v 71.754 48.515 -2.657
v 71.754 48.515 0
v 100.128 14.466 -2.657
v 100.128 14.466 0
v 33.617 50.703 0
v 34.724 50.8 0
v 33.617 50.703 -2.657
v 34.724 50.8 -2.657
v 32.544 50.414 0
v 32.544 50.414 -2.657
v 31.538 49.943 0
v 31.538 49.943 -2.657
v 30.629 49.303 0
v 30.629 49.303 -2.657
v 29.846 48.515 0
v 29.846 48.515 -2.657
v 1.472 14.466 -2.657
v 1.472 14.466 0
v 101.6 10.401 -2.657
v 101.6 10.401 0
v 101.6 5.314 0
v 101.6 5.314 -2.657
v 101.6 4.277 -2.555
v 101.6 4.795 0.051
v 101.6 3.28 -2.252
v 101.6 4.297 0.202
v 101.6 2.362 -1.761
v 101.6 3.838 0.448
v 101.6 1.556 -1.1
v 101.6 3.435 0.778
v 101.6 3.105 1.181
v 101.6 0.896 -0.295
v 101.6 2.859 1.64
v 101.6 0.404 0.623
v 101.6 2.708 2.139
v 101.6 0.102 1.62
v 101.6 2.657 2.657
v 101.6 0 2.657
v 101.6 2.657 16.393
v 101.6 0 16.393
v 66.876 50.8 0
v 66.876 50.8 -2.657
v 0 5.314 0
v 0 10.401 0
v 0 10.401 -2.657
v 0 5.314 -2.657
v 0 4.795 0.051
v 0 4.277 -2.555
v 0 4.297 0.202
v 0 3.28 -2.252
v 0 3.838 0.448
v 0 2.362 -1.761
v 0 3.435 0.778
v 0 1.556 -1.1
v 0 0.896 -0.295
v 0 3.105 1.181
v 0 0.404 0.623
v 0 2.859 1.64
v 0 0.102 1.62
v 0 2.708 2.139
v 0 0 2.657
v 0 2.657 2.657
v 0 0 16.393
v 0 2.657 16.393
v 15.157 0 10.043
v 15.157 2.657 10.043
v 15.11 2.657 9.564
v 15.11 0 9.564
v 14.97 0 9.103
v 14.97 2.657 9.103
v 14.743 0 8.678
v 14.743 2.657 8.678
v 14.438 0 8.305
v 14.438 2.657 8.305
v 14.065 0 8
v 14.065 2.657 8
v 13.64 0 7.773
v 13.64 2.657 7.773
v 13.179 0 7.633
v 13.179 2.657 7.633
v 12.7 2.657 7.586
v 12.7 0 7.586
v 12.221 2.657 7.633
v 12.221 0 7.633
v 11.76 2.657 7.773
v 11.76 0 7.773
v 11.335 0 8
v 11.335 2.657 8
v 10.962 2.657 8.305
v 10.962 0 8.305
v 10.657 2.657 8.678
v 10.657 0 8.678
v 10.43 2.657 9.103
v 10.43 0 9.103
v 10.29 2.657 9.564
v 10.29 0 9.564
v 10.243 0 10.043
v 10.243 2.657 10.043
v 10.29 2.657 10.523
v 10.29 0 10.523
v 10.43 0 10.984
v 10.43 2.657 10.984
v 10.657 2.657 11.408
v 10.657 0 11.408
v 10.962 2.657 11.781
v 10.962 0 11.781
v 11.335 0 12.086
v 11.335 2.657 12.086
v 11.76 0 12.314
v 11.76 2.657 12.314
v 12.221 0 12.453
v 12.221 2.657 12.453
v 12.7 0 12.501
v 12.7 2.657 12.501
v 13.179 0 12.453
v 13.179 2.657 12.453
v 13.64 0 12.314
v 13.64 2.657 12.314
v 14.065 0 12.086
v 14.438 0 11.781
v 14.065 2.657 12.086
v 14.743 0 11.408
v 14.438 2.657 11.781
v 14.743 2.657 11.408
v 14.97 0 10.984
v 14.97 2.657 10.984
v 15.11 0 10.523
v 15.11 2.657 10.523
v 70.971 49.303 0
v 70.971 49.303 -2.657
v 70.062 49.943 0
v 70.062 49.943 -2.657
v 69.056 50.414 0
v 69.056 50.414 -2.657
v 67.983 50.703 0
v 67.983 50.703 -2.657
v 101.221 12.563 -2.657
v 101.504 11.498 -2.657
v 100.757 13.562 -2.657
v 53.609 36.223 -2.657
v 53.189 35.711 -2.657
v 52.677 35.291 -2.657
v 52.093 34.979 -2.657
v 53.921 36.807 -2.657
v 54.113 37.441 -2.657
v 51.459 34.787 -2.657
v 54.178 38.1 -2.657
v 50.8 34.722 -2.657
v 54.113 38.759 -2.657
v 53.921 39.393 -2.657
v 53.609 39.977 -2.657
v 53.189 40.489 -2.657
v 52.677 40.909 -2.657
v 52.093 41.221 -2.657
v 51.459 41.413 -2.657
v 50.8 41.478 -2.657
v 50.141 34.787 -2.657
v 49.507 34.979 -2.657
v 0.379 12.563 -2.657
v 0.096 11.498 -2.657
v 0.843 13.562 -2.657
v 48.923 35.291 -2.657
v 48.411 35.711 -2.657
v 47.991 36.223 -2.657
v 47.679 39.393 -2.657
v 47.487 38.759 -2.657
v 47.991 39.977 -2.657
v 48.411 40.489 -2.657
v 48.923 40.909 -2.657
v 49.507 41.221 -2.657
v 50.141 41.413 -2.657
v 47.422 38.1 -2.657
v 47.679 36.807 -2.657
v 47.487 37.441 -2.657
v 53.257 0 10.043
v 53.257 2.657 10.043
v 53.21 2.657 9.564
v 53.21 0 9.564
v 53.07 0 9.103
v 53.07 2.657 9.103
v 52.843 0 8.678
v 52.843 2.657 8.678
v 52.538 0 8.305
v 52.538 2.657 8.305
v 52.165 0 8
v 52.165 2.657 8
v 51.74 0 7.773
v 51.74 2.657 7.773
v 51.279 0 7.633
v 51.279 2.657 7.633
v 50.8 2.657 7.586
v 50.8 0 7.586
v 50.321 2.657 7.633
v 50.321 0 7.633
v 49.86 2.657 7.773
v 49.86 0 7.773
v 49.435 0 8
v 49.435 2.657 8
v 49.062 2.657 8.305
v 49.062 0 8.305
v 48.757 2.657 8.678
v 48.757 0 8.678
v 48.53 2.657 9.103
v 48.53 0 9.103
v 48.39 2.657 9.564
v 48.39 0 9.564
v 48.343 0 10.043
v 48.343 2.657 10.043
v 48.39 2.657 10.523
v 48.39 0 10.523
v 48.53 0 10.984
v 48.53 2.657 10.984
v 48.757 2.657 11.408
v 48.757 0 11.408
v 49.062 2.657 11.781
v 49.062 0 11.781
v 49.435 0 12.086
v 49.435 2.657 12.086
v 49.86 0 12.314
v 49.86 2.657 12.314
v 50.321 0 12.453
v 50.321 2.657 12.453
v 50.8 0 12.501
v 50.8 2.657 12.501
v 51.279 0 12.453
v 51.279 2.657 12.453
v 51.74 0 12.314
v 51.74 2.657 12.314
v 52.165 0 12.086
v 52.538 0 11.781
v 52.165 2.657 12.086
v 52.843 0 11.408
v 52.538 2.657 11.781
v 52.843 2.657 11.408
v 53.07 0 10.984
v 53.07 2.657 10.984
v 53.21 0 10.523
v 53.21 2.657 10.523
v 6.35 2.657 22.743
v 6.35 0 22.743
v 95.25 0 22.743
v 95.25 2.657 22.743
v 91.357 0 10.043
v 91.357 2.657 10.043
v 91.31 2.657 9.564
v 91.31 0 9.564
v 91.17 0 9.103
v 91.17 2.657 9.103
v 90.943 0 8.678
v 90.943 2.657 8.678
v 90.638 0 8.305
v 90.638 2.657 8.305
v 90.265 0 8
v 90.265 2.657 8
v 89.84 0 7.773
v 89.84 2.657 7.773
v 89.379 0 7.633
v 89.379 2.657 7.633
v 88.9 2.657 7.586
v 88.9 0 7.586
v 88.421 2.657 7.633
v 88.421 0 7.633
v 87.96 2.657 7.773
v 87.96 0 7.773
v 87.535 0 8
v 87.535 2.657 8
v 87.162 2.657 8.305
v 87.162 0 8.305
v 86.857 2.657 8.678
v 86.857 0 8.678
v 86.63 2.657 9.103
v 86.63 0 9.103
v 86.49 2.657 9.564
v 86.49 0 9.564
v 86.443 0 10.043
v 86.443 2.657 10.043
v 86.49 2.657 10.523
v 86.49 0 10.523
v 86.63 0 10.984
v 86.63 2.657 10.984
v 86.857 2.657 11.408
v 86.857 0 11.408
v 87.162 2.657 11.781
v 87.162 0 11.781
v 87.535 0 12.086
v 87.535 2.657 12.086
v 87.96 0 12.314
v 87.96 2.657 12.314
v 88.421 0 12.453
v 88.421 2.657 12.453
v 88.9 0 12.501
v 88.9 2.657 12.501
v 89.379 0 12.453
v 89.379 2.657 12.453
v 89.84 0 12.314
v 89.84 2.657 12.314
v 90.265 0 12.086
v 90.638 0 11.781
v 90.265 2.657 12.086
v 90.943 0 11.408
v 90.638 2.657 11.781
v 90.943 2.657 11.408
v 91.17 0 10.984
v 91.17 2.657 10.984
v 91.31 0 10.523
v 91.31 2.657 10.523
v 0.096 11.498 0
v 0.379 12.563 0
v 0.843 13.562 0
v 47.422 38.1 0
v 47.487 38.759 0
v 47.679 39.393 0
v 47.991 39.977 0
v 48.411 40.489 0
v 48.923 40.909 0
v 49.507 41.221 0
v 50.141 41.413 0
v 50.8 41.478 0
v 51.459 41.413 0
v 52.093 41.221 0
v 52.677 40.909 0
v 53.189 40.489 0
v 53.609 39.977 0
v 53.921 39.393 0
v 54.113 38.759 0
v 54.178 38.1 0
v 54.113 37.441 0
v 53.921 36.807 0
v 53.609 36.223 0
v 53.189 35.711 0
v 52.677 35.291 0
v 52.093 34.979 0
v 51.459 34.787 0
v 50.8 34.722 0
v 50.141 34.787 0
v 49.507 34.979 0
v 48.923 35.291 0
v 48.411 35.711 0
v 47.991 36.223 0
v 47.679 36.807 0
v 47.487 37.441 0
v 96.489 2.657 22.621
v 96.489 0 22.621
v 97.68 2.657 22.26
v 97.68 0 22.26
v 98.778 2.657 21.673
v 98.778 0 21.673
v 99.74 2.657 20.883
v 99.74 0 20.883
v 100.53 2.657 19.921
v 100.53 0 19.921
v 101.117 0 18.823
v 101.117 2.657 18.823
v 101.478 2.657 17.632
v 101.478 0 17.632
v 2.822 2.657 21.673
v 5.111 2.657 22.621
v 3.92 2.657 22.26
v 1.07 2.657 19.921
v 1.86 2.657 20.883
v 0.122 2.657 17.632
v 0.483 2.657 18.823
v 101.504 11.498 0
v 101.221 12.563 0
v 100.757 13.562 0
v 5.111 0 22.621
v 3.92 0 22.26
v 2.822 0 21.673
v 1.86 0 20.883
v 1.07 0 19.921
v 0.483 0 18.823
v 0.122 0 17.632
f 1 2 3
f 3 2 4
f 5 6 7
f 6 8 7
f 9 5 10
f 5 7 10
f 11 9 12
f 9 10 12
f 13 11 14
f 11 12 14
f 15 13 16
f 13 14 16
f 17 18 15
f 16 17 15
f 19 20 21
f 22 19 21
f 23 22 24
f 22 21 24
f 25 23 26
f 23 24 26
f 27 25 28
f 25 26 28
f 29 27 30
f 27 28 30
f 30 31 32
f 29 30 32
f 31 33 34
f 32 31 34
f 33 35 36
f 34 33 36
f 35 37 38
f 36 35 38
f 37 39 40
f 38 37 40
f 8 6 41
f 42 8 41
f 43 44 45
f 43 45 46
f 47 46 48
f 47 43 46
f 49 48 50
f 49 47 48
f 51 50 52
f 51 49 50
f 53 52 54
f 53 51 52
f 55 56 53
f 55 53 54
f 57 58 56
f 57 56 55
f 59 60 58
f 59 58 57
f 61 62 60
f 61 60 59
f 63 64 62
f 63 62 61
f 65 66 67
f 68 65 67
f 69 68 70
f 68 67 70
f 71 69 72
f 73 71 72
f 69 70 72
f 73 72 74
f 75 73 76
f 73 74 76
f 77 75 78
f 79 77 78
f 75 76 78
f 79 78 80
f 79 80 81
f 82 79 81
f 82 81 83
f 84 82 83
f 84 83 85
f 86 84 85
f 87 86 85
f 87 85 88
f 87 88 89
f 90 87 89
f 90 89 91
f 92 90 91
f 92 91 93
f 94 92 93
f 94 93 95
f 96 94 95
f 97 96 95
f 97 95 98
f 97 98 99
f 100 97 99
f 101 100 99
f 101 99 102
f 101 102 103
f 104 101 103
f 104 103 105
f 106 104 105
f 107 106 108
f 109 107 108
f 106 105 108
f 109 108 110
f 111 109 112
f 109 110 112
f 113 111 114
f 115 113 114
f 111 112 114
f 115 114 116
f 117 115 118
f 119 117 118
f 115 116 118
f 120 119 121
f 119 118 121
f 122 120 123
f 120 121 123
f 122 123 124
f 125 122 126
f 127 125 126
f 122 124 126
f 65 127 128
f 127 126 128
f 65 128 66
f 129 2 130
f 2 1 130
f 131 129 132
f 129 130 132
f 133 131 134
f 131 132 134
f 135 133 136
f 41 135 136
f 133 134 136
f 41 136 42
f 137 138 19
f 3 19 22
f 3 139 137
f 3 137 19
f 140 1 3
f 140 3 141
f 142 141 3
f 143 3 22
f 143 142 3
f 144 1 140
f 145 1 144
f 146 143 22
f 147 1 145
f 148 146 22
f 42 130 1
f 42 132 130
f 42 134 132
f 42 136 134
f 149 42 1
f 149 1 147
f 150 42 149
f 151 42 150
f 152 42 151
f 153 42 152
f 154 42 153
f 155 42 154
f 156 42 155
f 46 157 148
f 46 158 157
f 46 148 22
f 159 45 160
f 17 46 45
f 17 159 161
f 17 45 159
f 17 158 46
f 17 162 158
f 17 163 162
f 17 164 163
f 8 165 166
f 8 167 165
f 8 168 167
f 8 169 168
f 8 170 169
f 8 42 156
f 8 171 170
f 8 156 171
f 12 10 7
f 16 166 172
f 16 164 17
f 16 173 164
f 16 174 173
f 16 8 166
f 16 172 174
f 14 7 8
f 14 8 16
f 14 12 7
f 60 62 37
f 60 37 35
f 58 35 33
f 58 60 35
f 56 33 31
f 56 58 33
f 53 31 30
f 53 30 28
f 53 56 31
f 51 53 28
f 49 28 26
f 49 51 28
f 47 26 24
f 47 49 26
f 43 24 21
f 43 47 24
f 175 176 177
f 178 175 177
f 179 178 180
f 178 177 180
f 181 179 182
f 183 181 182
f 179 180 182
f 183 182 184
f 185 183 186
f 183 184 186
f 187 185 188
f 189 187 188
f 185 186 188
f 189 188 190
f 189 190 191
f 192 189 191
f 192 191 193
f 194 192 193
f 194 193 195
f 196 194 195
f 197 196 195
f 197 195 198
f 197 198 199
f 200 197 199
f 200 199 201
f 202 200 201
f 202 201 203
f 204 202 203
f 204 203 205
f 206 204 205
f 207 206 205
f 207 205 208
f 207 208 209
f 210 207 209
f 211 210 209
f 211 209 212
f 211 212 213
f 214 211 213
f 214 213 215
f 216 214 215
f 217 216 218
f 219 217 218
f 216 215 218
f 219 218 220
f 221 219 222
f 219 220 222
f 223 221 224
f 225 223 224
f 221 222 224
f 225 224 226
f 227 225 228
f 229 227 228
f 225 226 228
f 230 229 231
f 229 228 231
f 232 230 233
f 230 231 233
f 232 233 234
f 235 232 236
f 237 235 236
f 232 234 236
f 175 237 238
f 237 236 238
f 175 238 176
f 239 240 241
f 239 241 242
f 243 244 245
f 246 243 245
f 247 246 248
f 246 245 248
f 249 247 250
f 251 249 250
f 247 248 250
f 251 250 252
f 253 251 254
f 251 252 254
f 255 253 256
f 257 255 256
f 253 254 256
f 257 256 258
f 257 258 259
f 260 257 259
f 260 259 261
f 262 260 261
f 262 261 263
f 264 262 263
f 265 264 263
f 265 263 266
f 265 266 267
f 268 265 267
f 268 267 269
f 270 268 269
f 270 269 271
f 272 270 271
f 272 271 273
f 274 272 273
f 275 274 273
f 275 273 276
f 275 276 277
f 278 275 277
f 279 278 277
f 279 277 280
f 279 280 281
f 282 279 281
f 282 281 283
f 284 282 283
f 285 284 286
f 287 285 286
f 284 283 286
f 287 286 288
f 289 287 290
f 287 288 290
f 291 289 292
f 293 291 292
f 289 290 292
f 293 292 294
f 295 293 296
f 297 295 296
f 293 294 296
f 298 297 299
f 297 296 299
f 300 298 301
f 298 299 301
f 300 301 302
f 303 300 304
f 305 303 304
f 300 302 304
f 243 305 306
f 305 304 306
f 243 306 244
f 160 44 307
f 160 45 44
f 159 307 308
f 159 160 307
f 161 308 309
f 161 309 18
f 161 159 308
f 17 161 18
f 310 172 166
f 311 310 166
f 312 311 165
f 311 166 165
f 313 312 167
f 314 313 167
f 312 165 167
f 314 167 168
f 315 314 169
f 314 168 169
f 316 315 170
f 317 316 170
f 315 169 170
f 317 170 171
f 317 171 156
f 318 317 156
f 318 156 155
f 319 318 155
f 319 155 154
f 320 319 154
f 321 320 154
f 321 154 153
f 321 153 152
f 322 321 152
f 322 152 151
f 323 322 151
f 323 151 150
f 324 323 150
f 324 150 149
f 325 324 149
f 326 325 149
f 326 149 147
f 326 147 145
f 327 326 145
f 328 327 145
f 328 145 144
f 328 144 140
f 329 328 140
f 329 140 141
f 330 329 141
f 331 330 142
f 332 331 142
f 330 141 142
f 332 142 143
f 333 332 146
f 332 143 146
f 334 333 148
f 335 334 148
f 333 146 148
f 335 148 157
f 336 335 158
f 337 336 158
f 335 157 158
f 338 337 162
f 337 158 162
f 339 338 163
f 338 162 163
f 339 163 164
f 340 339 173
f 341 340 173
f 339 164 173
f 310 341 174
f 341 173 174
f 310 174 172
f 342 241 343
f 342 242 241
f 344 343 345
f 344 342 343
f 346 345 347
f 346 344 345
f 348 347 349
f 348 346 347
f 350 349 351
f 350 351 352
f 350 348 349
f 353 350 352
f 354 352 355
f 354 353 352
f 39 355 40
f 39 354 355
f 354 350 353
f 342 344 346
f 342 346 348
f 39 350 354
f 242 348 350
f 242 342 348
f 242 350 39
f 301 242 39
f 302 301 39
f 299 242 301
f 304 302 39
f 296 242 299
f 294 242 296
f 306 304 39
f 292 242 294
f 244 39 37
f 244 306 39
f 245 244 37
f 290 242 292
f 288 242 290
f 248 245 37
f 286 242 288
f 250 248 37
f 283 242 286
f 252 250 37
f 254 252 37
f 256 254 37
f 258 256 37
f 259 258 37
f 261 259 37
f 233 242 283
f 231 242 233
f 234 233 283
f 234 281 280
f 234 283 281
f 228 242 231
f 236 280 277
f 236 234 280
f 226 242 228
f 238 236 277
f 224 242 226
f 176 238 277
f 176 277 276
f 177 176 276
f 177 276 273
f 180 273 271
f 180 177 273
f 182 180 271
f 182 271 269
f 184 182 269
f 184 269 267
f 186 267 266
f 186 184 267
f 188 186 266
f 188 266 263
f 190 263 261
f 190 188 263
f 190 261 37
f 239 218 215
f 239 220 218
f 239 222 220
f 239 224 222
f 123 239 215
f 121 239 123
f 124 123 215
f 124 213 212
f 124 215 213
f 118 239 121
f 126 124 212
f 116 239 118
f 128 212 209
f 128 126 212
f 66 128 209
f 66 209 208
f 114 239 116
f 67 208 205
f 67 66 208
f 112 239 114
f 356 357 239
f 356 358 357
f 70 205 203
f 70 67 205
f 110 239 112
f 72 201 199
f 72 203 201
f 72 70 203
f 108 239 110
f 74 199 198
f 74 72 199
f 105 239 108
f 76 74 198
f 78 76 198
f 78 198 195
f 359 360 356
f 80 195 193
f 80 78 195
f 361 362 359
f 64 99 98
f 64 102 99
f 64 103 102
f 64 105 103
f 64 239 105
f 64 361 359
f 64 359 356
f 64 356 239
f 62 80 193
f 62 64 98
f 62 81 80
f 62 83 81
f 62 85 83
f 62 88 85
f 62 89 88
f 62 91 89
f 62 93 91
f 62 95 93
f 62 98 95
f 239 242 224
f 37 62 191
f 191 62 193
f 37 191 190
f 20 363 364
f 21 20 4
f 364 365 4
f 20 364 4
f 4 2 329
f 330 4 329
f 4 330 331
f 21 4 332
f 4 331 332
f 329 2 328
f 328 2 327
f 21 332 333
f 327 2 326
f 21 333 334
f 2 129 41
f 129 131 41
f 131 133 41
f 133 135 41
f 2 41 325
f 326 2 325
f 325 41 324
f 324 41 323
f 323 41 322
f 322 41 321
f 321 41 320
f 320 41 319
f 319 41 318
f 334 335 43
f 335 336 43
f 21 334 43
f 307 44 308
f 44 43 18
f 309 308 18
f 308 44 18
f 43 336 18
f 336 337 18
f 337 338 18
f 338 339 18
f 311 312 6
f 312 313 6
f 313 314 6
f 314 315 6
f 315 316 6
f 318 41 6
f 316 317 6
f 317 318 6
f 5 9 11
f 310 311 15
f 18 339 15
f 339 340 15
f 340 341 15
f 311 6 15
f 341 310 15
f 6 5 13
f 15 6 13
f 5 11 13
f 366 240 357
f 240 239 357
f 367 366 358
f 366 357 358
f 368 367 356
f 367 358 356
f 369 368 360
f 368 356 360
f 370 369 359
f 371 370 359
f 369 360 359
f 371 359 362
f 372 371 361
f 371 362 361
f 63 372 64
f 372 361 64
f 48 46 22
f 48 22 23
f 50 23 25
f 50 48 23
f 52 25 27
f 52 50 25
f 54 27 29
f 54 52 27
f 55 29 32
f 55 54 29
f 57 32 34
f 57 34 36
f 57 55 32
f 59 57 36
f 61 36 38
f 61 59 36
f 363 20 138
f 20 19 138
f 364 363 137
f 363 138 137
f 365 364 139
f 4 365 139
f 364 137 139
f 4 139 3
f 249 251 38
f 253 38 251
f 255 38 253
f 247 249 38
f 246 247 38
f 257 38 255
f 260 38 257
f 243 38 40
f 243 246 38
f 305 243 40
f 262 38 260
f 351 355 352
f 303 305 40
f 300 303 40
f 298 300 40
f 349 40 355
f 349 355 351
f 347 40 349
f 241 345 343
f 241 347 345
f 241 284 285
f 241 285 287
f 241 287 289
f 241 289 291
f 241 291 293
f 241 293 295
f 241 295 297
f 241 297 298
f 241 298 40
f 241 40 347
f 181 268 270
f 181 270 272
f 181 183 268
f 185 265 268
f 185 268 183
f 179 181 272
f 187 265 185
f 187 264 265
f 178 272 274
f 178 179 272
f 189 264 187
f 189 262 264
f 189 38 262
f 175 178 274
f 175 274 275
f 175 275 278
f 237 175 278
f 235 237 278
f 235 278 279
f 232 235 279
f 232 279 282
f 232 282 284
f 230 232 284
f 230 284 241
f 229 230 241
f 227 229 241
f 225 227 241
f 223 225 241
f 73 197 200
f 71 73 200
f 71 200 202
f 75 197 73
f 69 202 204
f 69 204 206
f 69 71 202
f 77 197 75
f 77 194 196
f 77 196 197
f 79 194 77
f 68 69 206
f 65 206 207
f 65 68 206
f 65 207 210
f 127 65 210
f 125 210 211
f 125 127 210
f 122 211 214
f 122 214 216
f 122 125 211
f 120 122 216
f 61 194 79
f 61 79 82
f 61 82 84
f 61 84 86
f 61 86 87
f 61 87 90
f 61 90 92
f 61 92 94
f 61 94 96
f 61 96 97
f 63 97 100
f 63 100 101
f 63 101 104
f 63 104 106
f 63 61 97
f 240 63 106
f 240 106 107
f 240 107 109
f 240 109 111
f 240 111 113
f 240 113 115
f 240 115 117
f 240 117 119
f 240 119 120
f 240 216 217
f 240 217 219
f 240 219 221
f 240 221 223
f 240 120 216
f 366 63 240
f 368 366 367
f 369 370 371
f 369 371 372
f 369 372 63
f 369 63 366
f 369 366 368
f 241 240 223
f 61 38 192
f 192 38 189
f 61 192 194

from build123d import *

# Parameters (mm, degrees)
BASE_FLANGE1_DEPTH           = 2.65684
EDGE_FLANGE1_STRIP_W         = 15.94104
EDGE_FLANGE1_STRIP_H         = 2.65684
EDGE_FLANGE1_STRIP_CUT_DEPTH = 101.6
EDGE_FLANGE1_DEPTH           = 101.6
FILLET1_R                    = 6.35
F_10_0_1935_DIAMETER_HOLE1_D = 4.9149
F_1_4_CLEARANCE_HOLE1_D      = 6.7564


# Sheet-metal steps are written as plain solids
with BuildPart() as part:
    # Sketch1 → Base-Flange1 (new body)
    with BuildSketch(Plane.XY):
        Polygon((0, 0), (0, 12.7), (31.75, 50.8), (69.85, 50.8), (101.6, 12.7), (101.6, 0), align=None)
    extrude(amount=-BASE_FLANGE1_DEPTH)

    # Edge-Flange1 strip (across the edge) → Edge-Flange1 strip cut (cut)
    with BuildSketch(Plane.YZ):
        with Locations((-2.65684, -1.32842)):
            Rectangle(EDGE_FLANGE1_STRIP_W, EDGE_FLANGE1_STRIP_H)
    extrude(amount=EDGE_FLANGE1_STRIP_CUT_DEPTH, mode=Mode.SUBTRACT)

    # Edge-Flange1 section (across the edge) → Edge-Flange1 (add)
    with BuildSketch(Plane.YZ):
        with BuildLine():
            Line((0, 2.65684), (0, 22.74316))
            Line((0, 22.74316), (2.65684, 22.74316))
            Line((2.65684, 22.74316), (2.65684, 2.65684))
            ThreePointArc((2.65684, 2.65684), (3.435010419, 0.778170419), (5.31368, 0))
            Line((5.31368, 0), (5.31368, -2.65684))
            ThreePointArc((5.31368, -2.65684), (1.556340839, -1.100499161), (0, 2.65684))
        make_face()
    extrude(amount=EDGE_FLANGE1_DEPTH)

    # Fillet1
    fillet1_edges = [part.edges().sort_by_distance(p)[0] for p in [
        (0, 12.7, -1.32842),
        (31.75, 50.8, -1.32842),
        (69.85, 50.8, -1.32842),
        (101.6, 12.7, -1.32842),
        (0, 1.32842, 22.74316),
        (101.6, 1.32842, 22.74316),
    ]]
    fillet(fillet1_edges, radius=FILLET1_R)

    # #10 (0.1935) Diameter Hole1 (through all)
    with Locations(Plane(origin=(0, 0, 0), x_dir=(-1, 0, 0), z_dir=(0, -1, 0))):
        with Locations((-88.9, -10.04316), (-50.8, -10.04316), (-12.7, -10.04316)):
            Hole(F_10_0_1935_DIAMETER_HOLE1_D / 2)

    # 1/4 Clearance Hole1 (through all)
    with Locations(Plane.XY):
        with Locations((50.8, 38.1)):
            Hole(F_1_4_CLEARANCE_HOLE1_D / 2)


solid = part.part
